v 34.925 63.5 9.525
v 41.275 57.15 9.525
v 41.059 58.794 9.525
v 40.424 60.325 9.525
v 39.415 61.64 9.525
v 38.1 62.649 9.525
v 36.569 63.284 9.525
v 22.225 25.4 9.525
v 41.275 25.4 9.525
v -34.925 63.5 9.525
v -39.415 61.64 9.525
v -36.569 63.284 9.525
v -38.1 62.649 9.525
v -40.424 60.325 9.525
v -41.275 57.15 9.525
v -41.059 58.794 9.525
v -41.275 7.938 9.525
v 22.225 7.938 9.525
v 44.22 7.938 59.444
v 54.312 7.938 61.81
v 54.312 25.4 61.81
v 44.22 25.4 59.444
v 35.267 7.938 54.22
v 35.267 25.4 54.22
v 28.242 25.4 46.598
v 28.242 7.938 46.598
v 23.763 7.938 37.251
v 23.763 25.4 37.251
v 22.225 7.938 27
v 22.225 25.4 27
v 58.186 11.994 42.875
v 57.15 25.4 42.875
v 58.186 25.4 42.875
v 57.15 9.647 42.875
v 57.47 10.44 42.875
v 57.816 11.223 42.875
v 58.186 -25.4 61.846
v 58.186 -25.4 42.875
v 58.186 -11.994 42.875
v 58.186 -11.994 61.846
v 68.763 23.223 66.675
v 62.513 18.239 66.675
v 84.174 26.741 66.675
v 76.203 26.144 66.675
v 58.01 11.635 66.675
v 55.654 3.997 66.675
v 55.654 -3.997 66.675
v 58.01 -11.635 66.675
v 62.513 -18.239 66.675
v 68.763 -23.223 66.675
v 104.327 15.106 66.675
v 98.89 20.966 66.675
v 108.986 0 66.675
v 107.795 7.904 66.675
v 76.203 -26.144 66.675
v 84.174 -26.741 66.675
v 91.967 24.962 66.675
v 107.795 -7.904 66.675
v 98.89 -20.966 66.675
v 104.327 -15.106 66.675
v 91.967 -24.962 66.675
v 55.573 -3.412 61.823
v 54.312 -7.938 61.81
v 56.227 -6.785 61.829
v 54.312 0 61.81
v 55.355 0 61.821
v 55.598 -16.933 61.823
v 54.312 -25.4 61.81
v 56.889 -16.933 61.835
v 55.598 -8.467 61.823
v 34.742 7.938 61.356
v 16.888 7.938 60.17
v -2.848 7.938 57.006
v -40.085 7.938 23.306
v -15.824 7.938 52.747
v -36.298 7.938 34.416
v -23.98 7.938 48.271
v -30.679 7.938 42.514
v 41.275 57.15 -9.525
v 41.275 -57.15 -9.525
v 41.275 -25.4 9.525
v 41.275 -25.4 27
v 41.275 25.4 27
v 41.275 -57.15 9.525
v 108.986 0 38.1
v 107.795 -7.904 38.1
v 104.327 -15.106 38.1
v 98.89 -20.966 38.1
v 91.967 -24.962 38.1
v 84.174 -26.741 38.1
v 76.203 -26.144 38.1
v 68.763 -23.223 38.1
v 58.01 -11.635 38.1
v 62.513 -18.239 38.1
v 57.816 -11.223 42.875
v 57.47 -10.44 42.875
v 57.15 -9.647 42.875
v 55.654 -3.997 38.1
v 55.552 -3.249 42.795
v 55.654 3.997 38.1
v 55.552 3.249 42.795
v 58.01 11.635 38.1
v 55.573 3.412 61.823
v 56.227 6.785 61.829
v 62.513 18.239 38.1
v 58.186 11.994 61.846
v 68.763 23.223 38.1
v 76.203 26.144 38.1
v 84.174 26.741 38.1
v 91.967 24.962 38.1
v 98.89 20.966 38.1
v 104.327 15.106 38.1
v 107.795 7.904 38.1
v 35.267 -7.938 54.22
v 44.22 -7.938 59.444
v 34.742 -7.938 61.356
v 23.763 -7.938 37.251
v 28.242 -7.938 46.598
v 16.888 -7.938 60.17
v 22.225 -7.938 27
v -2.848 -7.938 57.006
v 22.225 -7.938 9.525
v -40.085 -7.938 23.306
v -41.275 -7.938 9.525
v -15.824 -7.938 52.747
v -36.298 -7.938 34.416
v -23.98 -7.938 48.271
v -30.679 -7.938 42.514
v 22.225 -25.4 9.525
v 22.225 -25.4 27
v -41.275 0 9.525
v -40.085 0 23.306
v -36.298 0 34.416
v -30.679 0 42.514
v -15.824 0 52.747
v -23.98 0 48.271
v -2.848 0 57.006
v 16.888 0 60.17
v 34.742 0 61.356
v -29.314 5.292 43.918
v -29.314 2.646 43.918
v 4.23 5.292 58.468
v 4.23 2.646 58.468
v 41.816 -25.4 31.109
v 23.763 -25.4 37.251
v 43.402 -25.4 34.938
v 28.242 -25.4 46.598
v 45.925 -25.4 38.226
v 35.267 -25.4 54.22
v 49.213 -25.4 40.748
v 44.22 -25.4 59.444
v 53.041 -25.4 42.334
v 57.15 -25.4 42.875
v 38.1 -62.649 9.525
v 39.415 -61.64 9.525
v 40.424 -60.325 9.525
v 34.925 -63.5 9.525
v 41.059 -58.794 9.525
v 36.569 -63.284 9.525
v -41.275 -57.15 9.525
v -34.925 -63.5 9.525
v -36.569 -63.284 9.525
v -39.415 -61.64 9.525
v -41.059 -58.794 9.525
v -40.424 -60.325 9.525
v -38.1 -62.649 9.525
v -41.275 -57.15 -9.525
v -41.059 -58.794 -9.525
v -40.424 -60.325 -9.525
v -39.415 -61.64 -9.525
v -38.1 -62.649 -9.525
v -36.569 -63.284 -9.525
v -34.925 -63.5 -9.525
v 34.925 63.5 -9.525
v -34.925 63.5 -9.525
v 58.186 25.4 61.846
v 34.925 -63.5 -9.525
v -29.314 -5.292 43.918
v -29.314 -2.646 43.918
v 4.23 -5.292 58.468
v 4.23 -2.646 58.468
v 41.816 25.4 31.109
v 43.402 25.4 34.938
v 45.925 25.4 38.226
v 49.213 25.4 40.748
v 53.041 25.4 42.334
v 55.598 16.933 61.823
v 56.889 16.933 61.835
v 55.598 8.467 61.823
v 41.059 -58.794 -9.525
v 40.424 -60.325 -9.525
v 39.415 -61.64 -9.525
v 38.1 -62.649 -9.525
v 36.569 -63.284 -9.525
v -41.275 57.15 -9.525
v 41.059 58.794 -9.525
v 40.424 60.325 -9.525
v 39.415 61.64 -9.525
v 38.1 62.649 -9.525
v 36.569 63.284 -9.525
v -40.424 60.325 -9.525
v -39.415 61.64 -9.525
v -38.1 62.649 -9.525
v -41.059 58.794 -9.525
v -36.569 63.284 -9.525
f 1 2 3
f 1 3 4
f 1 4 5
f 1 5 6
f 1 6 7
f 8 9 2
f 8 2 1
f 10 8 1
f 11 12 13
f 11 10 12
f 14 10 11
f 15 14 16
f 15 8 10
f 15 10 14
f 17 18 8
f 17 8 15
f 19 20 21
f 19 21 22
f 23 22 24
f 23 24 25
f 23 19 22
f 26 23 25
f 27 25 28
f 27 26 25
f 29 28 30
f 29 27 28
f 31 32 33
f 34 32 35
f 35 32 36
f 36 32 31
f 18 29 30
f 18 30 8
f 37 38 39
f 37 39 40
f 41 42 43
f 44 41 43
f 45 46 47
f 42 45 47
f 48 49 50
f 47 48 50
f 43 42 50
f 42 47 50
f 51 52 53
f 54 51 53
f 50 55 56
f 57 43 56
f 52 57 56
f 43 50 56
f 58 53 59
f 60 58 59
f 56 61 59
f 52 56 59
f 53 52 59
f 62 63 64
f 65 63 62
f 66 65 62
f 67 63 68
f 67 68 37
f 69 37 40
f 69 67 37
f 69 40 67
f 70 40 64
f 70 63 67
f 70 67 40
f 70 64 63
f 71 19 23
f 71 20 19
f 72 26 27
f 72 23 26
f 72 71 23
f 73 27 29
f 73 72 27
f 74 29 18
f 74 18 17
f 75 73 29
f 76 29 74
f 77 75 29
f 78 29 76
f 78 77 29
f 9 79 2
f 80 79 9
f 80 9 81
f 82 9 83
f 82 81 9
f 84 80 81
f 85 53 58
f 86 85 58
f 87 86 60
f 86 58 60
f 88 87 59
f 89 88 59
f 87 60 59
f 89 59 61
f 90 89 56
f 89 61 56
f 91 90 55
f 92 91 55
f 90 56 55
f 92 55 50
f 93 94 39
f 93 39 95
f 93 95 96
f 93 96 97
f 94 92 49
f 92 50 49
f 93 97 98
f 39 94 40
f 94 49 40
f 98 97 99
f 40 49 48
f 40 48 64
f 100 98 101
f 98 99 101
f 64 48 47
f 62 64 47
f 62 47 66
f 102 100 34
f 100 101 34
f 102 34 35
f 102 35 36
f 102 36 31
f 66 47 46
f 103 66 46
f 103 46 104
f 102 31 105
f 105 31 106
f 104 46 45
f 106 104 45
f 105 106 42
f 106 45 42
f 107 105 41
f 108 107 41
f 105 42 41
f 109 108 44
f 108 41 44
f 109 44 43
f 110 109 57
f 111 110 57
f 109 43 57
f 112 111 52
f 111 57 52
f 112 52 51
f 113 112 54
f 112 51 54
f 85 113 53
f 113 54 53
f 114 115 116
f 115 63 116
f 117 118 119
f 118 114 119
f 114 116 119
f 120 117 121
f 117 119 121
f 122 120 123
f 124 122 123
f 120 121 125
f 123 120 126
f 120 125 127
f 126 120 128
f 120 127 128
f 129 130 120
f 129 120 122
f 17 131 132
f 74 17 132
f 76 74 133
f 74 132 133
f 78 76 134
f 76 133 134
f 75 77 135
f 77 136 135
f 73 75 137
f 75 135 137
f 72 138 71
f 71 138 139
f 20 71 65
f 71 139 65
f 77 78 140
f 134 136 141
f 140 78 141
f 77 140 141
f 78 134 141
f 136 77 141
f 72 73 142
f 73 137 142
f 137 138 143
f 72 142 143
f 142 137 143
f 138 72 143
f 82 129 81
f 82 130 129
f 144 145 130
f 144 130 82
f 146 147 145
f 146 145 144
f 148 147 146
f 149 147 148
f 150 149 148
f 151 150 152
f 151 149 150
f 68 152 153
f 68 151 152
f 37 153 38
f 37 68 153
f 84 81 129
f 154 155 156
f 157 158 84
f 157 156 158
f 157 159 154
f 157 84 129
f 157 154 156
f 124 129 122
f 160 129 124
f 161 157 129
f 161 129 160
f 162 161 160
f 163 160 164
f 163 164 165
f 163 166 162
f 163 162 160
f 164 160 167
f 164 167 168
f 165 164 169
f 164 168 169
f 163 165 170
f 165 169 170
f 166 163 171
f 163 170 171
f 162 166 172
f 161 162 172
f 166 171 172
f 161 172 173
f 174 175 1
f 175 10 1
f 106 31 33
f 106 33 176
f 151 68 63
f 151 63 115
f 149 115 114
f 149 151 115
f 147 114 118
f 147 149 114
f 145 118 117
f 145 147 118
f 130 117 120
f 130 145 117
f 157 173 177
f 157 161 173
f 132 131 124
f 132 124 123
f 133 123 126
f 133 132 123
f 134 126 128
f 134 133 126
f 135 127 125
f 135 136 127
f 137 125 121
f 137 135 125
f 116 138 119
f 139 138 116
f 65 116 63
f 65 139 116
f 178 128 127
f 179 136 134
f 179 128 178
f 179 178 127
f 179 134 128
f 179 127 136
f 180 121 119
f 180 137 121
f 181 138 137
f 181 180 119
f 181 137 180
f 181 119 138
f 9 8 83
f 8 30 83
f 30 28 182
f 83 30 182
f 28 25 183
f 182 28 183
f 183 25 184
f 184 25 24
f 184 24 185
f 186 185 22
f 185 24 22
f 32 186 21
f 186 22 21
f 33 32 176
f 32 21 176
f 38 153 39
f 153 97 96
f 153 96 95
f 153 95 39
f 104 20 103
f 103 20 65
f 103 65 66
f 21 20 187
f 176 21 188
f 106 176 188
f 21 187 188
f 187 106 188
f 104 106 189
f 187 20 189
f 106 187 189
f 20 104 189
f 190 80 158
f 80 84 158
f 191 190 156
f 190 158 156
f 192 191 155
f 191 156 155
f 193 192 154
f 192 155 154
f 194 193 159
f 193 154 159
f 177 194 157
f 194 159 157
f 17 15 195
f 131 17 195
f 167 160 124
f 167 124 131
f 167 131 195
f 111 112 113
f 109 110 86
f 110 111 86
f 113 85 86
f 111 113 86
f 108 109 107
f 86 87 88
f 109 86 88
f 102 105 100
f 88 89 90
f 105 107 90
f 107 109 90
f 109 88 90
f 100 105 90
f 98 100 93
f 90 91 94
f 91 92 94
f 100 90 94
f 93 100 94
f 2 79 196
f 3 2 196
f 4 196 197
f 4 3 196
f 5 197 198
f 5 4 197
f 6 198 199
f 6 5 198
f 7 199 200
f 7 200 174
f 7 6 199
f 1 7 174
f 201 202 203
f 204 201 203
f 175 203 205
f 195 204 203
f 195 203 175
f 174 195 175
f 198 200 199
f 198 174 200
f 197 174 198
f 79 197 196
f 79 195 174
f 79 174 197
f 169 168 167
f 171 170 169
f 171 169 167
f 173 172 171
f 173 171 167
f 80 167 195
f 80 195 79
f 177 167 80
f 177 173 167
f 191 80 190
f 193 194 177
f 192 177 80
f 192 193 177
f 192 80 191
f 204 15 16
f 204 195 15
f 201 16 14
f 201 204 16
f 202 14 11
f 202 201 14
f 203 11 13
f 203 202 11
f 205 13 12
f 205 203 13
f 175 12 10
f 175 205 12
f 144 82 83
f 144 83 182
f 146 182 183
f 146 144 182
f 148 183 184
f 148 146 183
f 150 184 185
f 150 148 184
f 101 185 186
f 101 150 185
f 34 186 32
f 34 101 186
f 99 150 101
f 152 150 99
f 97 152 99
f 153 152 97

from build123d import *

# Parameters (mm, degrees)
F1_DEPTH = 63.5
F2_DEPTH = 25.4
F3_DEPTH = 7.9375
F5_R     = 6.35


with BuildPart() as f1:
    # F0 (on Front) → F1 (new body, symmetric)
    with BuildSketch(Plane.XZ):
        Polygon((-41.275, -9.525), (41.275, -9.525), (41.275, 9.525), (22.225, 9.525), (-41.275, 9.525), align=None)
    extrude(amount=F1_DEPTH, both=True)

    # F0 (on Front) → F2 (join, symmetric)
    with BuildSketch(Plane.XZ):
        with BuildLine():
            Line((22.225, 9.525), (41.275, 9.525))
            Line((41.275, 9.525), (41.275, 27.0002))
            ThreePointArc((41.275, 27.0002), (45.92468, 38.22552), (57.15, 42.8752))
            Line((57.15, 42.8752), (58.186395, 42.8752))
            Line((58.186395, 42.8752), (58.186395, 61.846107))
            add(Edge.make_bspline(
                [(54.311995, 61.809701), (55.594718, 61.823662), (56.886272, 61.835647), (58.186395, 61.846107)],
                knots=[110.184899, 110.184899, 110.184899, 110.184899, 112.679002, 112.679002, 112.679002, 112.679002], degree=3))
            ThreePointArc((54.311995, 61.809701), (31.470505, 50.671261), (22.225, 27.0002))
            Line((22.225, 27.0002), (22.225, 9.525))
        make_face()
    extrude(amount=F2_DEPTH, both=True)

    # F0 (on Front) → F3 (join, symmetric)
    with BuildSketch(Plane.XZ):
        with BuildLine():
            add(Edge.make_bspline(
                [(-41.275, 9.525), (-41.788435, 56.718878), (-2.356346, 61.192912), (54.311995, 61.809701)],
                knots=[0, 0, 0, 0, 110.184899, 110.184899, 110.184899, 110.184899], degree=3))
            Line((-41.275, 9.525), (22.225, 9.525))
            Line((22.225, 9.525), (22.225, 27.0002))
            ThreePointArc((22.225, 27.0002), (31.470505, 50.671261), (54.311995, 61.809701))
        make_face()
    extrude(amount=F3_DEPTH, both=True)

    # F0 (on Front) → F4 (revolve)
    with BuildSketch(Plane.XZ):
        Polygon((82.170509, 61.855137), (82.170509, 42.8752), (82.170509, 38.1), (108.986395, 38.1), (108.986395, 66.675), (82.170509, 66.675), align=None)
    revolve(axis=Axis((82.170509, 0, 51.389013), (0, 0, -1)))

    # F5
    f5_edges = [f1.edges().sort_by_distance(p)[0] for p in [
        (41.275, -63.5, 0),
        (-41.275, -63.5, 0),
        (41.275, 63.5, 0),
        (-41.275, 63.5, 0),
    ]]
    fillet(f5_edges, radius=F5_R)


solid = f1.part
